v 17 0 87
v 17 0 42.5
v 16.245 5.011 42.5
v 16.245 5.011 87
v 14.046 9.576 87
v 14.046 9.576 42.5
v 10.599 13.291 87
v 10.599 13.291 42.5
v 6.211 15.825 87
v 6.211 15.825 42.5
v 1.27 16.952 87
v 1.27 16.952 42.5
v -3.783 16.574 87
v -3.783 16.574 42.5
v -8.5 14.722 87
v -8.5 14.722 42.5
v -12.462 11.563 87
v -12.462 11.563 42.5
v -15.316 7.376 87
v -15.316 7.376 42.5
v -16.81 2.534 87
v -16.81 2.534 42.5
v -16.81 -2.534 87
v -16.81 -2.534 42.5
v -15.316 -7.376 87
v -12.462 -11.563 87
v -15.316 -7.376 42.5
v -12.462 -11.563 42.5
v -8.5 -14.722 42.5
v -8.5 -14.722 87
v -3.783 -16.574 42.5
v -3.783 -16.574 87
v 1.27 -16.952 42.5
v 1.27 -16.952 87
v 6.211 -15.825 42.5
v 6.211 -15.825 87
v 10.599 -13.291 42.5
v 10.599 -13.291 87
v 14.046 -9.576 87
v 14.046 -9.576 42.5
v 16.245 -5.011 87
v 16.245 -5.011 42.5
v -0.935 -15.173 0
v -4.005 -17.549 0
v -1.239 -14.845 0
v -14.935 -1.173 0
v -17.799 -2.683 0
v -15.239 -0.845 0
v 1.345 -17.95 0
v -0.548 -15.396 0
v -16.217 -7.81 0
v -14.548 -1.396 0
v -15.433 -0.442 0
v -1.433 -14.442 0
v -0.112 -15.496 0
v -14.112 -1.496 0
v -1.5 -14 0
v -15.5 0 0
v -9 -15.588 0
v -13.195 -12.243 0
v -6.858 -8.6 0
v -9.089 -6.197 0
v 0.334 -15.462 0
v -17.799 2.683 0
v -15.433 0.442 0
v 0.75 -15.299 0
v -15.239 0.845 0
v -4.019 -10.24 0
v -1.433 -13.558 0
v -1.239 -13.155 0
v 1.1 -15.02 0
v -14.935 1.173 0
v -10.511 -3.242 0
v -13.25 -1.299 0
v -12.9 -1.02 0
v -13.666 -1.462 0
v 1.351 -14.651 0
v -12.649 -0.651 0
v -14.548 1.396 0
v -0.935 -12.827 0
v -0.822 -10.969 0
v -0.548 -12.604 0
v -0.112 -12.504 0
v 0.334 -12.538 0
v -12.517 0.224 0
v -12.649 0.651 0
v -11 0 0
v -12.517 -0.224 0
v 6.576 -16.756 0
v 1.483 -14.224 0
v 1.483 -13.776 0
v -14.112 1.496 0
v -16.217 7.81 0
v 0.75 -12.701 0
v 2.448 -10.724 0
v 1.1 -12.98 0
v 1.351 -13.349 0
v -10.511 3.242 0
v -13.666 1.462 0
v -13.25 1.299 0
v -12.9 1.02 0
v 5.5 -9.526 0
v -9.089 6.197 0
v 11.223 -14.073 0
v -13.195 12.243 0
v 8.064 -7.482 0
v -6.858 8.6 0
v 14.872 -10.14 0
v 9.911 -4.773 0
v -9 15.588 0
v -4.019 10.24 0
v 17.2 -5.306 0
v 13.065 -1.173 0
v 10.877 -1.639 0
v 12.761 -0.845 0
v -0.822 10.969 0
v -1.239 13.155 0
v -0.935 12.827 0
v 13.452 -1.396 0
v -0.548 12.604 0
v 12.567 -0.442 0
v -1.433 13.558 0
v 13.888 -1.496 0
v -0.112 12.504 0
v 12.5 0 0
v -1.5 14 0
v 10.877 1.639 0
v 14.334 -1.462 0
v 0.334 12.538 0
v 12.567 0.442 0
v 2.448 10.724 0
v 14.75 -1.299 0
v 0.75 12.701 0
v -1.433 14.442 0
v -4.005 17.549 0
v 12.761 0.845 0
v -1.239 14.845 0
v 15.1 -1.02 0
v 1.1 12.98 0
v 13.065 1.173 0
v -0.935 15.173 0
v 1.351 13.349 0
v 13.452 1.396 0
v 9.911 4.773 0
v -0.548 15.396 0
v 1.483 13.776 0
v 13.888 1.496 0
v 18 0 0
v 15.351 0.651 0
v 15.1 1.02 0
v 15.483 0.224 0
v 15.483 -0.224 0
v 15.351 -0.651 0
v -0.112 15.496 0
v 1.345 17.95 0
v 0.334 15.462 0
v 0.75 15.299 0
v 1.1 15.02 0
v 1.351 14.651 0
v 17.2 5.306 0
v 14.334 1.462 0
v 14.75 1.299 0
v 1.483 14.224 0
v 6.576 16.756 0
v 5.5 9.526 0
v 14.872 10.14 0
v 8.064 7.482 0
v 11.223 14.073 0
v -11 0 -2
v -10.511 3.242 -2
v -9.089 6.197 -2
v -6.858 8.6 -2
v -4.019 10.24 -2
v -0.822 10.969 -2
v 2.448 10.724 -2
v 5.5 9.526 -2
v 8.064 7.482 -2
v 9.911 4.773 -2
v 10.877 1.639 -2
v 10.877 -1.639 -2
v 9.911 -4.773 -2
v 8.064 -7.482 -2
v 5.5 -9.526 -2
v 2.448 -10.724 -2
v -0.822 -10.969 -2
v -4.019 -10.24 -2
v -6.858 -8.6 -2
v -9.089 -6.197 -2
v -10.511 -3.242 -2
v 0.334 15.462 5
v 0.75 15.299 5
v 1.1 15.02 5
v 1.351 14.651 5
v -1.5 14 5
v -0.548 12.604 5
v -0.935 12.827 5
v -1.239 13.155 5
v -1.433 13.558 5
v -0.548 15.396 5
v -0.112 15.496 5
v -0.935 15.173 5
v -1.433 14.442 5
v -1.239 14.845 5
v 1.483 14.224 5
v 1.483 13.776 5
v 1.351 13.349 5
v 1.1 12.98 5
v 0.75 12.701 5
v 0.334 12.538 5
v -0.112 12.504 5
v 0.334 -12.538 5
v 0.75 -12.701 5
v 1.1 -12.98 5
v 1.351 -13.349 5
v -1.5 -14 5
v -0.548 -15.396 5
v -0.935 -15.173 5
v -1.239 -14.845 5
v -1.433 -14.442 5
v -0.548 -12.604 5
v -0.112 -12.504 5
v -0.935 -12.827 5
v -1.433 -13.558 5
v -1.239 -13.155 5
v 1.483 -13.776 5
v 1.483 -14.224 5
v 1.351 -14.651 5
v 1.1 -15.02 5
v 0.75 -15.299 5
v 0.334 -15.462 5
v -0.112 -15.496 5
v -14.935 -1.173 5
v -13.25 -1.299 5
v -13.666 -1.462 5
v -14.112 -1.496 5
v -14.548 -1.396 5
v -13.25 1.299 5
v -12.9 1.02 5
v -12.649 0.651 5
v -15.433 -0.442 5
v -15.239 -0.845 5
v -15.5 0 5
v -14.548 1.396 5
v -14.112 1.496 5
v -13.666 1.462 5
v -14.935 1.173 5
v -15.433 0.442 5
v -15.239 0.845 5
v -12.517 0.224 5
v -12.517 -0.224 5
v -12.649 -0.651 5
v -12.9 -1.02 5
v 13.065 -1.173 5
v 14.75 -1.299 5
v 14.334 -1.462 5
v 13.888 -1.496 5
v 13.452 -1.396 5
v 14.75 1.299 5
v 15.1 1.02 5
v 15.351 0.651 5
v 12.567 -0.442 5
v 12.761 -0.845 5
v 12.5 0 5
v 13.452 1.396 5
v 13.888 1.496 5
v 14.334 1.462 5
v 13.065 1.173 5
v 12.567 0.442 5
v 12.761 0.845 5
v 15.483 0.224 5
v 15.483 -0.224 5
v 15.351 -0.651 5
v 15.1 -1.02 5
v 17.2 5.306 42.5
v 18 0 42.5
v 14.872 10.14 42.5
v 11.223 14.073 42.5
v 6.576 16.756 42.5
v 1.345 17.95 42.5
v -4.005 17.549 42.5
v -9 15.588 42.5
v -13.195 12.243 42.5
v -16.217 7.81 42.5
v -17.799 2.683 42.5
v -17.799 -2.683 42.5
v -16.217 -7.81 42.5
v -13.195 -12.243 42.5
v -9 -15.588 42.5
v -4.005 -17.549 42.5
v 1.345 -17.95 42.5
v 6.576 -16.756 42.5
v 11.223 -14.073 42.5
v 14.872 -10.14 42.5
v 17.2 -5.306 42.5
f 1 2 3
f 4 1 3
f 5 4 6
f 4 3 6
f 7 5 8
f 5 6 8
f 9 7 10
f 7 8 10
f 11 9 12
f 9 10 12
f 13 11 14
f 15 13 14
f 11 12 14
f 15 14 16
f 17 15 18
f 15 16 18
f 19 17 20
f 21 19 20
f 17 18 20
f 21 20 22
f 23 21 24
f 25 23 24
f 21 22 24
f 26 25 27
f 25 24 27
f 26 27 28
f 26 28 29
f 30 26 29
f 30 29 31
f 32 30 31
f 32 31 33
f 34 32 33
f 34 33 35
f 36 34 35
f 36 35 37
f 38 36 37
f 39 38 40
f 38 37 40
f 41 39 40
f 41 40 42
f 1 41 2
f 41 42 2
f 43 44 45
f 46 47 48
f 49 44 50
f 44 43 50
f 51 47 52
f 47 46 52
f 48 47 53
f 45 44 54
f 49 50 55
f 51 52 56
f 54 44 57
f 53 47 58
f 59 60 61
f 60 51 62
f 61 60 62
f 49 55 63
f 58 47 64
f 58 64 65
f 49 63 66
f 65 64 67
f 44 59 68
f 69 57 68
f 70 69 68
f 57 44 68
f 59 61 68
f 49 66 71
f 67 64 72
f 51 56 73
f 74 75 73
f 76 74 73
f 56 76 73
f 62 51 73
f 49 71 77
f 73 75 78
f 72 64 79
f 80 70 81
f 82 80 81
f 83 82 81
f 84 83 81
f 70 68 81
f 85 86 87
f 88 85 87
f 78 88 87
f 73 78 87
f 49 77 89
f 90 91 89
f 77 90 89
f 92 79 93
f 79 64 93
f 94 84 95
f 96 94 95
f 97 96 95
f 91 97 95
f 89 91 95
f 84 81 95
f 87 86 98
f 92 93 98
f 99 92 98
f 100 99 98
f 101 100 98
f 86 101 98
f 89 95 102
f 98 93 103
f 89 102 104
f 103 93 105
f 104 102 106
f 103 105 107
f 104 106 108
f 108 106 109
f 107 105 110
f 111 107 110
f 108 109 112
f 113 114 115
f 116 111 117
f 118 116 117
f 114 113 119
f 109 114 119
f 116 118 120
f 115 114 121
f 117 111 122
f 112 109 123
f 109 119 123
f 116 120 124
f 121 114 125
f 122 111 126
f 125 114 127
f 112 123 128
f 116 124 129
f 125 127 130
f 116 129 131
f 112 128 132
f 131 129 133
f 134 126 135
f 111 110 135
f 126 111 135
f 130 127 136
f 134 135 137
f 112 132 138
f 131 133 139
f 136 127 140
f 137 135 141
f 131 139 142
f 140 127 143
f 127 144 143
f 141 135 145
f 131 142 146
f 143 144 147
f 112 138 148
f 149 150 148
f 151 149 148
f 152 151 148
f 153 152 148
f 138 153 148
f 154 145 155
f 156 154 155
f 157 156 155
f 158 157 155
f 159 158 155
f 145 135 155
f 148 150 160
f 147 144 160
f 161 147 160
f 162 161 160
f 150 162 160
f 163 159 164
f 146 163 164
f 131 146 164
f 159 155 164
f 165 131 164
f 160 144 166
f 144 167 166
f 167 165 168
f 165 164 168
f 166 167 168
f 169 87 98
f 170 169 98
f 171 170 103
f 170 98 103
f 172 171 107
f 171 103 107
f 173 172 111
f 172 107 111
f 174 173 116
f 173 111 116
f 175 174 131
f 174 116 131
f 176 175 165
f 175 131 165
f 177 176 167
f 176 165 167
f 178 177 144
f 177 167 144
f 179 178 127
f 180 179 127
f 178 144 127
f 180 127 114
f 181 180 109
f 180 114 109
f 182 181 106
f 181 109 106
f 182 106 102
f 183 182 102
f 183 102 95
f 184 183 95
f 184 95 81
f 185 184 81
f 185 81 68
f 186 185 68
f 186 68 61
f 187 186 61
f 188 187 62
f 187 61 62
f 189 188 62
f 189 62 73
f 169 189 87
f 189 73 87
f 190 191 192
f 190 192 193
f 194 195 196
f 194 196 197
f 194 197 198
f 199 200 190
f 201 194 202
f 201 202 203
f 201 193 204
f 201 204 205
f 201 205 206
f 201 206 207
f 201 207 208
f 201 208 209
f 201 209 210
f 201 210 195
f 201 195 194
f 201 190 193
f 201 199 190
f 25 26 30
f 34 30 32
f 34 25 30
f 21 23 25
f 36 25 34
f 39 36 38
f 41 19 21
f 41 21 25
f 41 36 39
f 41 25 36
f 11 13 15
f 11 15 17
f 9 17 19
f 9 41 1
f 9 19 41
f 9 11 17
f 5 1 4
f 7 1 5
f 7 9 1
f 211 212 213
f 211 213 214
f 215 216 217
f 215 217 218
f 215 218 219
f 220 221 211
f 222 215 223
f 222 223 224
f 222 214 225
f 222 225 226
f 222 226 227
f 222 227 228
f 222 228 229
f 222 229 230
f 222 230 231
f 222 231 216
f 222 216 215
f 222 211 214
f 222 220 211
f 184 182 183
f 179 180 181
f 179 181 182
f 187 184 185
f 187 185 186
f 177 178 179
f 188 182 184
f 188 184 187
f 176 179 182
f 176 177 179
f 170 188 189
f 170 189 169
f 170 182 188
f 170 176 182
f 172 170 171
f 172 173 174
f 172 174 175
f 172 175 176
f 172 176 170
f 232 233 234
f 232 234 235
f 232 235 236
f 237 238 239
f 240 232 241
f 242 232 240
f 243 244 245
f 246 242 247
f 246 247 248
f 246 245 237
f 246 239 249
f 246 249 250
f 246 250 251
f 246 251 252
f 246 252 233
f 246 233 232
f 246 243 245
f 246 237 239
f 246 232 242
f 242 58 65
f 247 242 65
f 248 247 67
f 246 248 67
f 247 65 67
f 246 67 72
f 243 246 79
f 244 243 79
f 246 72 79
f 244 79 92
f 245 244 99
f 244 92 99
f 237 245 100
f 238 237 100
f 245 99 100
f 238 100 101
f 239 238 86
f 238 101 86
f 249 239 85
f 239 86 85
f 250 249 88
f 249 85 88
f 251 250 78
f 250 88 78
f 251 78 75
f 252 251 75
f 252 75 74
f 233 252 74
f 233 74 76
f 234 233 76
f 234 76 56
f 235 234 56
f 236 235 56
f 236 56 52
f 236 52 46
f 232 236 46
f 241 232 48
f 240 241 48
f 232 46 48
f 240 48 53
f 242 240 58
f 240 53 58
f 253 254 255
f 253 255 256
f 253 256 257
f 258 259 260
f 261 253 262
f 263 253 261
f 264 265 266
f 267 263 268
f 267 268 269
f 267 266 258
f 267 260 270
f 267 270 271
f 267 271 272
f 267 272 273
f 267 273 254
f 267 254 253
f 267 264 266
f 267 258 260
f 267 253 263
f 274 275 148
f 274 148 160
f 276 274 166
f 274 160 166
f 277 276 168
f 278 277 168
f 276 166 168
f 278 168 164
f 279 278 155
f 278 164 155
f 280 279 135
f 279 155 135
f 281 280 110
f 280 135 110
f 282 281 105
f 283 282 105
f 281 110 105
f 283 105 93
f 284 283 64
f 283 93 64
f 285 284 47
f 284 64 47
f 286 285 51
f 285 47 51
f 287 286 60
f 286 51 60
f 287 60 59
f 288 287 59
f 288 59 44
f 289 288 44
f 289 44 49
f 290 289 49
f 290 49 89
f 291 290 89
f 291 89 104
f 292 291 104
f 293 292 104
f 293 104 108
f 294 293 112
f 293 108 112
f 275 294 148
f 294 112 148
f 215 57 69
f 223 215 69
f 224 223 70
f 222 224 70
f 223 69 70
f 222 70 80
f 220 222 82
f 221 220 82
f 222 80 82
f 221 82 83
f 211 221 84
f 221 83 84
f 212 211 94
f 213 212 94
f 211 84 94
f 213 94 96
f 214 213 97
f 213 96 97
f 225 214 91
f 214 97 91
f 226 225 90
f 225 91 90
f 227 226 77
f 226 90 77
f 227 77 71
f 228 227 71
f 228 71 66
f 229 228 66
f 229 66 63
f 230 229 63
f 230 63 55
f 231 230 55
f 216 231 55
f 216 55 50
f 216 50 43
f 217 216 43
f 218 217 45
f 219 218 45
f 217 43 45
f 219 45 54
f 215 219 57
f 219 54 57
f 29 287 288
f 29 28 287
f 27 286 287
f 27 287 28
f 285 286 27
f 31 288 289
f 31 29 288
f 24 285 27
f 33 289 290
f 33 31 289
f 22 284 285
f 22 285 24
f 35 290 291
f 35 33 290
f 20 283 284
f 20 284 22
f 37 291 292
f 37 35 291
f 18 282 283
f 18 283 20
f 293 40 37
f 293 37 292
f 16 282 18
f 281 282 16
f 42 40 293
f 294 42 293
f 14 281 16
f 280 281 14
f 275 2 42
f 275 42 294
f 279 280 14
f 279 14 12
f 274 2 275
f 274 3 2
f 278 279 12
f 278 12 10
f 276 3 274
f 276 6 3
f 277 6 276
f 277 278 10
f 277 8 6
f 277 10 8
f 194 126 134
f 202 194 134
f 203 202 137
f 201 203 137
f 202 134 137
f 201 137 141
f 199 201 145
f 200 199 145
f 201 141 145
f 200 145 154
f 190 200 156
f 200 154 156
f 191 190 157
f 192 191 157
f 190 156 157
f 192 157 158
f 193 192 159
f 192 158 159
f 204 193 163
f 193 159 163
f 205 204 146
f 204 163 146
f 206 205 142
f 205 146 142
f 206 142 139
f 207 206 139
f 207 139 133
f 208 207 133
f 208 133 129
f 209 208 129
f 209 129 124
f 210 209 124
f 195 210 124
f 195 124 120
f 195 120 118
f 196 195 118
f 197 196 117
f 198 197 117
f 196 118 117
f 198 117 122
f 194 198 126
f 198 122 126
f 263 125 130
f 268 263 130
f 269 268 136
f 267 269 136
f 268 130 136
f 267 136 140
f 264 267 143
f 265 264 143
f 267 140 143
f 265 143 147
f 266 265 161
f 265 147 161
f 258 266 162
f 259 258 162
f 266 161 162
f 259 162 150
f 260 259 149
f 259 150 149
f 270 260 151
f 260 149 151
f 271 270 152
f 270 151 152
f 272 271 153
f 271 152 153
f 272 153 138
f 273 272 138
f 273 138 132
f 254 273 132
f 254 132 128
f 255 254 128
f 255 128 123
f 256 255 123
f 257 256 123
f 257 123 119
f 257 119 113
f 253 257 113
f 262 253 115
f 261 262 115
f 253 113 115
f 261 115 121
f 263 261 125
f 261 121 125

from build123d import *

# Parameters (mm, degrees)
SKETCH1_R      = 18
GEARBOX_DEPTH  = 42.5
SKETCH2_R      = 17
MOTOR_DEPTH    = 44.5
SKETCH3_R      = 11
PLATFORM_DEPTH = 2
SKETCH4_R      = 1.5
SCREWS_DEPTH   = 5


with BuildPart() as part:
    # Sketch1 → Gearbox (new body)
    with BuildSketch(Plane.XY):
        Circle(SKETCH1_R)
    extrude(amount=GEARBOX_DEPTH)

    # Sketch2 → Motor (add)
    with BuildSketch(Plane.XY.offset(42.5)):
        Circle(SKETCH2_R)
    extrude(amount=MOTOR_DEPTH)

    # Sketch3 → Platform (add)
    with BuildSketch(Plane(origin=(0, 0, 0), x_dir=(-1, 0, 0), z_dir=(0, 0, -1))):
        Circle(SKETCH3_R)
    extrude(amount=PLATFORM_DEPTH)

    # Sketch4 → Screws (cut)
    with BuildSketch(Plane(origin=(0, 0, 0), x_dir=(-1, 0, 0), z_dir=(0, 0, -1))):
        with Locations((0, 14)):
            Circle(SKETCH4_R)
        with Locations((14, 0)):
            Circle(SKETCH4_R)
        with Locations((0, -14)):
            Circle(SKETCH4_R)
        with Locations((-14, 0)):
            Circle(SKETCH4_R)
    extrude(amount=-SCREWS_DEPTH, mode=Mode.SUBTRACT)


solid = part.part
